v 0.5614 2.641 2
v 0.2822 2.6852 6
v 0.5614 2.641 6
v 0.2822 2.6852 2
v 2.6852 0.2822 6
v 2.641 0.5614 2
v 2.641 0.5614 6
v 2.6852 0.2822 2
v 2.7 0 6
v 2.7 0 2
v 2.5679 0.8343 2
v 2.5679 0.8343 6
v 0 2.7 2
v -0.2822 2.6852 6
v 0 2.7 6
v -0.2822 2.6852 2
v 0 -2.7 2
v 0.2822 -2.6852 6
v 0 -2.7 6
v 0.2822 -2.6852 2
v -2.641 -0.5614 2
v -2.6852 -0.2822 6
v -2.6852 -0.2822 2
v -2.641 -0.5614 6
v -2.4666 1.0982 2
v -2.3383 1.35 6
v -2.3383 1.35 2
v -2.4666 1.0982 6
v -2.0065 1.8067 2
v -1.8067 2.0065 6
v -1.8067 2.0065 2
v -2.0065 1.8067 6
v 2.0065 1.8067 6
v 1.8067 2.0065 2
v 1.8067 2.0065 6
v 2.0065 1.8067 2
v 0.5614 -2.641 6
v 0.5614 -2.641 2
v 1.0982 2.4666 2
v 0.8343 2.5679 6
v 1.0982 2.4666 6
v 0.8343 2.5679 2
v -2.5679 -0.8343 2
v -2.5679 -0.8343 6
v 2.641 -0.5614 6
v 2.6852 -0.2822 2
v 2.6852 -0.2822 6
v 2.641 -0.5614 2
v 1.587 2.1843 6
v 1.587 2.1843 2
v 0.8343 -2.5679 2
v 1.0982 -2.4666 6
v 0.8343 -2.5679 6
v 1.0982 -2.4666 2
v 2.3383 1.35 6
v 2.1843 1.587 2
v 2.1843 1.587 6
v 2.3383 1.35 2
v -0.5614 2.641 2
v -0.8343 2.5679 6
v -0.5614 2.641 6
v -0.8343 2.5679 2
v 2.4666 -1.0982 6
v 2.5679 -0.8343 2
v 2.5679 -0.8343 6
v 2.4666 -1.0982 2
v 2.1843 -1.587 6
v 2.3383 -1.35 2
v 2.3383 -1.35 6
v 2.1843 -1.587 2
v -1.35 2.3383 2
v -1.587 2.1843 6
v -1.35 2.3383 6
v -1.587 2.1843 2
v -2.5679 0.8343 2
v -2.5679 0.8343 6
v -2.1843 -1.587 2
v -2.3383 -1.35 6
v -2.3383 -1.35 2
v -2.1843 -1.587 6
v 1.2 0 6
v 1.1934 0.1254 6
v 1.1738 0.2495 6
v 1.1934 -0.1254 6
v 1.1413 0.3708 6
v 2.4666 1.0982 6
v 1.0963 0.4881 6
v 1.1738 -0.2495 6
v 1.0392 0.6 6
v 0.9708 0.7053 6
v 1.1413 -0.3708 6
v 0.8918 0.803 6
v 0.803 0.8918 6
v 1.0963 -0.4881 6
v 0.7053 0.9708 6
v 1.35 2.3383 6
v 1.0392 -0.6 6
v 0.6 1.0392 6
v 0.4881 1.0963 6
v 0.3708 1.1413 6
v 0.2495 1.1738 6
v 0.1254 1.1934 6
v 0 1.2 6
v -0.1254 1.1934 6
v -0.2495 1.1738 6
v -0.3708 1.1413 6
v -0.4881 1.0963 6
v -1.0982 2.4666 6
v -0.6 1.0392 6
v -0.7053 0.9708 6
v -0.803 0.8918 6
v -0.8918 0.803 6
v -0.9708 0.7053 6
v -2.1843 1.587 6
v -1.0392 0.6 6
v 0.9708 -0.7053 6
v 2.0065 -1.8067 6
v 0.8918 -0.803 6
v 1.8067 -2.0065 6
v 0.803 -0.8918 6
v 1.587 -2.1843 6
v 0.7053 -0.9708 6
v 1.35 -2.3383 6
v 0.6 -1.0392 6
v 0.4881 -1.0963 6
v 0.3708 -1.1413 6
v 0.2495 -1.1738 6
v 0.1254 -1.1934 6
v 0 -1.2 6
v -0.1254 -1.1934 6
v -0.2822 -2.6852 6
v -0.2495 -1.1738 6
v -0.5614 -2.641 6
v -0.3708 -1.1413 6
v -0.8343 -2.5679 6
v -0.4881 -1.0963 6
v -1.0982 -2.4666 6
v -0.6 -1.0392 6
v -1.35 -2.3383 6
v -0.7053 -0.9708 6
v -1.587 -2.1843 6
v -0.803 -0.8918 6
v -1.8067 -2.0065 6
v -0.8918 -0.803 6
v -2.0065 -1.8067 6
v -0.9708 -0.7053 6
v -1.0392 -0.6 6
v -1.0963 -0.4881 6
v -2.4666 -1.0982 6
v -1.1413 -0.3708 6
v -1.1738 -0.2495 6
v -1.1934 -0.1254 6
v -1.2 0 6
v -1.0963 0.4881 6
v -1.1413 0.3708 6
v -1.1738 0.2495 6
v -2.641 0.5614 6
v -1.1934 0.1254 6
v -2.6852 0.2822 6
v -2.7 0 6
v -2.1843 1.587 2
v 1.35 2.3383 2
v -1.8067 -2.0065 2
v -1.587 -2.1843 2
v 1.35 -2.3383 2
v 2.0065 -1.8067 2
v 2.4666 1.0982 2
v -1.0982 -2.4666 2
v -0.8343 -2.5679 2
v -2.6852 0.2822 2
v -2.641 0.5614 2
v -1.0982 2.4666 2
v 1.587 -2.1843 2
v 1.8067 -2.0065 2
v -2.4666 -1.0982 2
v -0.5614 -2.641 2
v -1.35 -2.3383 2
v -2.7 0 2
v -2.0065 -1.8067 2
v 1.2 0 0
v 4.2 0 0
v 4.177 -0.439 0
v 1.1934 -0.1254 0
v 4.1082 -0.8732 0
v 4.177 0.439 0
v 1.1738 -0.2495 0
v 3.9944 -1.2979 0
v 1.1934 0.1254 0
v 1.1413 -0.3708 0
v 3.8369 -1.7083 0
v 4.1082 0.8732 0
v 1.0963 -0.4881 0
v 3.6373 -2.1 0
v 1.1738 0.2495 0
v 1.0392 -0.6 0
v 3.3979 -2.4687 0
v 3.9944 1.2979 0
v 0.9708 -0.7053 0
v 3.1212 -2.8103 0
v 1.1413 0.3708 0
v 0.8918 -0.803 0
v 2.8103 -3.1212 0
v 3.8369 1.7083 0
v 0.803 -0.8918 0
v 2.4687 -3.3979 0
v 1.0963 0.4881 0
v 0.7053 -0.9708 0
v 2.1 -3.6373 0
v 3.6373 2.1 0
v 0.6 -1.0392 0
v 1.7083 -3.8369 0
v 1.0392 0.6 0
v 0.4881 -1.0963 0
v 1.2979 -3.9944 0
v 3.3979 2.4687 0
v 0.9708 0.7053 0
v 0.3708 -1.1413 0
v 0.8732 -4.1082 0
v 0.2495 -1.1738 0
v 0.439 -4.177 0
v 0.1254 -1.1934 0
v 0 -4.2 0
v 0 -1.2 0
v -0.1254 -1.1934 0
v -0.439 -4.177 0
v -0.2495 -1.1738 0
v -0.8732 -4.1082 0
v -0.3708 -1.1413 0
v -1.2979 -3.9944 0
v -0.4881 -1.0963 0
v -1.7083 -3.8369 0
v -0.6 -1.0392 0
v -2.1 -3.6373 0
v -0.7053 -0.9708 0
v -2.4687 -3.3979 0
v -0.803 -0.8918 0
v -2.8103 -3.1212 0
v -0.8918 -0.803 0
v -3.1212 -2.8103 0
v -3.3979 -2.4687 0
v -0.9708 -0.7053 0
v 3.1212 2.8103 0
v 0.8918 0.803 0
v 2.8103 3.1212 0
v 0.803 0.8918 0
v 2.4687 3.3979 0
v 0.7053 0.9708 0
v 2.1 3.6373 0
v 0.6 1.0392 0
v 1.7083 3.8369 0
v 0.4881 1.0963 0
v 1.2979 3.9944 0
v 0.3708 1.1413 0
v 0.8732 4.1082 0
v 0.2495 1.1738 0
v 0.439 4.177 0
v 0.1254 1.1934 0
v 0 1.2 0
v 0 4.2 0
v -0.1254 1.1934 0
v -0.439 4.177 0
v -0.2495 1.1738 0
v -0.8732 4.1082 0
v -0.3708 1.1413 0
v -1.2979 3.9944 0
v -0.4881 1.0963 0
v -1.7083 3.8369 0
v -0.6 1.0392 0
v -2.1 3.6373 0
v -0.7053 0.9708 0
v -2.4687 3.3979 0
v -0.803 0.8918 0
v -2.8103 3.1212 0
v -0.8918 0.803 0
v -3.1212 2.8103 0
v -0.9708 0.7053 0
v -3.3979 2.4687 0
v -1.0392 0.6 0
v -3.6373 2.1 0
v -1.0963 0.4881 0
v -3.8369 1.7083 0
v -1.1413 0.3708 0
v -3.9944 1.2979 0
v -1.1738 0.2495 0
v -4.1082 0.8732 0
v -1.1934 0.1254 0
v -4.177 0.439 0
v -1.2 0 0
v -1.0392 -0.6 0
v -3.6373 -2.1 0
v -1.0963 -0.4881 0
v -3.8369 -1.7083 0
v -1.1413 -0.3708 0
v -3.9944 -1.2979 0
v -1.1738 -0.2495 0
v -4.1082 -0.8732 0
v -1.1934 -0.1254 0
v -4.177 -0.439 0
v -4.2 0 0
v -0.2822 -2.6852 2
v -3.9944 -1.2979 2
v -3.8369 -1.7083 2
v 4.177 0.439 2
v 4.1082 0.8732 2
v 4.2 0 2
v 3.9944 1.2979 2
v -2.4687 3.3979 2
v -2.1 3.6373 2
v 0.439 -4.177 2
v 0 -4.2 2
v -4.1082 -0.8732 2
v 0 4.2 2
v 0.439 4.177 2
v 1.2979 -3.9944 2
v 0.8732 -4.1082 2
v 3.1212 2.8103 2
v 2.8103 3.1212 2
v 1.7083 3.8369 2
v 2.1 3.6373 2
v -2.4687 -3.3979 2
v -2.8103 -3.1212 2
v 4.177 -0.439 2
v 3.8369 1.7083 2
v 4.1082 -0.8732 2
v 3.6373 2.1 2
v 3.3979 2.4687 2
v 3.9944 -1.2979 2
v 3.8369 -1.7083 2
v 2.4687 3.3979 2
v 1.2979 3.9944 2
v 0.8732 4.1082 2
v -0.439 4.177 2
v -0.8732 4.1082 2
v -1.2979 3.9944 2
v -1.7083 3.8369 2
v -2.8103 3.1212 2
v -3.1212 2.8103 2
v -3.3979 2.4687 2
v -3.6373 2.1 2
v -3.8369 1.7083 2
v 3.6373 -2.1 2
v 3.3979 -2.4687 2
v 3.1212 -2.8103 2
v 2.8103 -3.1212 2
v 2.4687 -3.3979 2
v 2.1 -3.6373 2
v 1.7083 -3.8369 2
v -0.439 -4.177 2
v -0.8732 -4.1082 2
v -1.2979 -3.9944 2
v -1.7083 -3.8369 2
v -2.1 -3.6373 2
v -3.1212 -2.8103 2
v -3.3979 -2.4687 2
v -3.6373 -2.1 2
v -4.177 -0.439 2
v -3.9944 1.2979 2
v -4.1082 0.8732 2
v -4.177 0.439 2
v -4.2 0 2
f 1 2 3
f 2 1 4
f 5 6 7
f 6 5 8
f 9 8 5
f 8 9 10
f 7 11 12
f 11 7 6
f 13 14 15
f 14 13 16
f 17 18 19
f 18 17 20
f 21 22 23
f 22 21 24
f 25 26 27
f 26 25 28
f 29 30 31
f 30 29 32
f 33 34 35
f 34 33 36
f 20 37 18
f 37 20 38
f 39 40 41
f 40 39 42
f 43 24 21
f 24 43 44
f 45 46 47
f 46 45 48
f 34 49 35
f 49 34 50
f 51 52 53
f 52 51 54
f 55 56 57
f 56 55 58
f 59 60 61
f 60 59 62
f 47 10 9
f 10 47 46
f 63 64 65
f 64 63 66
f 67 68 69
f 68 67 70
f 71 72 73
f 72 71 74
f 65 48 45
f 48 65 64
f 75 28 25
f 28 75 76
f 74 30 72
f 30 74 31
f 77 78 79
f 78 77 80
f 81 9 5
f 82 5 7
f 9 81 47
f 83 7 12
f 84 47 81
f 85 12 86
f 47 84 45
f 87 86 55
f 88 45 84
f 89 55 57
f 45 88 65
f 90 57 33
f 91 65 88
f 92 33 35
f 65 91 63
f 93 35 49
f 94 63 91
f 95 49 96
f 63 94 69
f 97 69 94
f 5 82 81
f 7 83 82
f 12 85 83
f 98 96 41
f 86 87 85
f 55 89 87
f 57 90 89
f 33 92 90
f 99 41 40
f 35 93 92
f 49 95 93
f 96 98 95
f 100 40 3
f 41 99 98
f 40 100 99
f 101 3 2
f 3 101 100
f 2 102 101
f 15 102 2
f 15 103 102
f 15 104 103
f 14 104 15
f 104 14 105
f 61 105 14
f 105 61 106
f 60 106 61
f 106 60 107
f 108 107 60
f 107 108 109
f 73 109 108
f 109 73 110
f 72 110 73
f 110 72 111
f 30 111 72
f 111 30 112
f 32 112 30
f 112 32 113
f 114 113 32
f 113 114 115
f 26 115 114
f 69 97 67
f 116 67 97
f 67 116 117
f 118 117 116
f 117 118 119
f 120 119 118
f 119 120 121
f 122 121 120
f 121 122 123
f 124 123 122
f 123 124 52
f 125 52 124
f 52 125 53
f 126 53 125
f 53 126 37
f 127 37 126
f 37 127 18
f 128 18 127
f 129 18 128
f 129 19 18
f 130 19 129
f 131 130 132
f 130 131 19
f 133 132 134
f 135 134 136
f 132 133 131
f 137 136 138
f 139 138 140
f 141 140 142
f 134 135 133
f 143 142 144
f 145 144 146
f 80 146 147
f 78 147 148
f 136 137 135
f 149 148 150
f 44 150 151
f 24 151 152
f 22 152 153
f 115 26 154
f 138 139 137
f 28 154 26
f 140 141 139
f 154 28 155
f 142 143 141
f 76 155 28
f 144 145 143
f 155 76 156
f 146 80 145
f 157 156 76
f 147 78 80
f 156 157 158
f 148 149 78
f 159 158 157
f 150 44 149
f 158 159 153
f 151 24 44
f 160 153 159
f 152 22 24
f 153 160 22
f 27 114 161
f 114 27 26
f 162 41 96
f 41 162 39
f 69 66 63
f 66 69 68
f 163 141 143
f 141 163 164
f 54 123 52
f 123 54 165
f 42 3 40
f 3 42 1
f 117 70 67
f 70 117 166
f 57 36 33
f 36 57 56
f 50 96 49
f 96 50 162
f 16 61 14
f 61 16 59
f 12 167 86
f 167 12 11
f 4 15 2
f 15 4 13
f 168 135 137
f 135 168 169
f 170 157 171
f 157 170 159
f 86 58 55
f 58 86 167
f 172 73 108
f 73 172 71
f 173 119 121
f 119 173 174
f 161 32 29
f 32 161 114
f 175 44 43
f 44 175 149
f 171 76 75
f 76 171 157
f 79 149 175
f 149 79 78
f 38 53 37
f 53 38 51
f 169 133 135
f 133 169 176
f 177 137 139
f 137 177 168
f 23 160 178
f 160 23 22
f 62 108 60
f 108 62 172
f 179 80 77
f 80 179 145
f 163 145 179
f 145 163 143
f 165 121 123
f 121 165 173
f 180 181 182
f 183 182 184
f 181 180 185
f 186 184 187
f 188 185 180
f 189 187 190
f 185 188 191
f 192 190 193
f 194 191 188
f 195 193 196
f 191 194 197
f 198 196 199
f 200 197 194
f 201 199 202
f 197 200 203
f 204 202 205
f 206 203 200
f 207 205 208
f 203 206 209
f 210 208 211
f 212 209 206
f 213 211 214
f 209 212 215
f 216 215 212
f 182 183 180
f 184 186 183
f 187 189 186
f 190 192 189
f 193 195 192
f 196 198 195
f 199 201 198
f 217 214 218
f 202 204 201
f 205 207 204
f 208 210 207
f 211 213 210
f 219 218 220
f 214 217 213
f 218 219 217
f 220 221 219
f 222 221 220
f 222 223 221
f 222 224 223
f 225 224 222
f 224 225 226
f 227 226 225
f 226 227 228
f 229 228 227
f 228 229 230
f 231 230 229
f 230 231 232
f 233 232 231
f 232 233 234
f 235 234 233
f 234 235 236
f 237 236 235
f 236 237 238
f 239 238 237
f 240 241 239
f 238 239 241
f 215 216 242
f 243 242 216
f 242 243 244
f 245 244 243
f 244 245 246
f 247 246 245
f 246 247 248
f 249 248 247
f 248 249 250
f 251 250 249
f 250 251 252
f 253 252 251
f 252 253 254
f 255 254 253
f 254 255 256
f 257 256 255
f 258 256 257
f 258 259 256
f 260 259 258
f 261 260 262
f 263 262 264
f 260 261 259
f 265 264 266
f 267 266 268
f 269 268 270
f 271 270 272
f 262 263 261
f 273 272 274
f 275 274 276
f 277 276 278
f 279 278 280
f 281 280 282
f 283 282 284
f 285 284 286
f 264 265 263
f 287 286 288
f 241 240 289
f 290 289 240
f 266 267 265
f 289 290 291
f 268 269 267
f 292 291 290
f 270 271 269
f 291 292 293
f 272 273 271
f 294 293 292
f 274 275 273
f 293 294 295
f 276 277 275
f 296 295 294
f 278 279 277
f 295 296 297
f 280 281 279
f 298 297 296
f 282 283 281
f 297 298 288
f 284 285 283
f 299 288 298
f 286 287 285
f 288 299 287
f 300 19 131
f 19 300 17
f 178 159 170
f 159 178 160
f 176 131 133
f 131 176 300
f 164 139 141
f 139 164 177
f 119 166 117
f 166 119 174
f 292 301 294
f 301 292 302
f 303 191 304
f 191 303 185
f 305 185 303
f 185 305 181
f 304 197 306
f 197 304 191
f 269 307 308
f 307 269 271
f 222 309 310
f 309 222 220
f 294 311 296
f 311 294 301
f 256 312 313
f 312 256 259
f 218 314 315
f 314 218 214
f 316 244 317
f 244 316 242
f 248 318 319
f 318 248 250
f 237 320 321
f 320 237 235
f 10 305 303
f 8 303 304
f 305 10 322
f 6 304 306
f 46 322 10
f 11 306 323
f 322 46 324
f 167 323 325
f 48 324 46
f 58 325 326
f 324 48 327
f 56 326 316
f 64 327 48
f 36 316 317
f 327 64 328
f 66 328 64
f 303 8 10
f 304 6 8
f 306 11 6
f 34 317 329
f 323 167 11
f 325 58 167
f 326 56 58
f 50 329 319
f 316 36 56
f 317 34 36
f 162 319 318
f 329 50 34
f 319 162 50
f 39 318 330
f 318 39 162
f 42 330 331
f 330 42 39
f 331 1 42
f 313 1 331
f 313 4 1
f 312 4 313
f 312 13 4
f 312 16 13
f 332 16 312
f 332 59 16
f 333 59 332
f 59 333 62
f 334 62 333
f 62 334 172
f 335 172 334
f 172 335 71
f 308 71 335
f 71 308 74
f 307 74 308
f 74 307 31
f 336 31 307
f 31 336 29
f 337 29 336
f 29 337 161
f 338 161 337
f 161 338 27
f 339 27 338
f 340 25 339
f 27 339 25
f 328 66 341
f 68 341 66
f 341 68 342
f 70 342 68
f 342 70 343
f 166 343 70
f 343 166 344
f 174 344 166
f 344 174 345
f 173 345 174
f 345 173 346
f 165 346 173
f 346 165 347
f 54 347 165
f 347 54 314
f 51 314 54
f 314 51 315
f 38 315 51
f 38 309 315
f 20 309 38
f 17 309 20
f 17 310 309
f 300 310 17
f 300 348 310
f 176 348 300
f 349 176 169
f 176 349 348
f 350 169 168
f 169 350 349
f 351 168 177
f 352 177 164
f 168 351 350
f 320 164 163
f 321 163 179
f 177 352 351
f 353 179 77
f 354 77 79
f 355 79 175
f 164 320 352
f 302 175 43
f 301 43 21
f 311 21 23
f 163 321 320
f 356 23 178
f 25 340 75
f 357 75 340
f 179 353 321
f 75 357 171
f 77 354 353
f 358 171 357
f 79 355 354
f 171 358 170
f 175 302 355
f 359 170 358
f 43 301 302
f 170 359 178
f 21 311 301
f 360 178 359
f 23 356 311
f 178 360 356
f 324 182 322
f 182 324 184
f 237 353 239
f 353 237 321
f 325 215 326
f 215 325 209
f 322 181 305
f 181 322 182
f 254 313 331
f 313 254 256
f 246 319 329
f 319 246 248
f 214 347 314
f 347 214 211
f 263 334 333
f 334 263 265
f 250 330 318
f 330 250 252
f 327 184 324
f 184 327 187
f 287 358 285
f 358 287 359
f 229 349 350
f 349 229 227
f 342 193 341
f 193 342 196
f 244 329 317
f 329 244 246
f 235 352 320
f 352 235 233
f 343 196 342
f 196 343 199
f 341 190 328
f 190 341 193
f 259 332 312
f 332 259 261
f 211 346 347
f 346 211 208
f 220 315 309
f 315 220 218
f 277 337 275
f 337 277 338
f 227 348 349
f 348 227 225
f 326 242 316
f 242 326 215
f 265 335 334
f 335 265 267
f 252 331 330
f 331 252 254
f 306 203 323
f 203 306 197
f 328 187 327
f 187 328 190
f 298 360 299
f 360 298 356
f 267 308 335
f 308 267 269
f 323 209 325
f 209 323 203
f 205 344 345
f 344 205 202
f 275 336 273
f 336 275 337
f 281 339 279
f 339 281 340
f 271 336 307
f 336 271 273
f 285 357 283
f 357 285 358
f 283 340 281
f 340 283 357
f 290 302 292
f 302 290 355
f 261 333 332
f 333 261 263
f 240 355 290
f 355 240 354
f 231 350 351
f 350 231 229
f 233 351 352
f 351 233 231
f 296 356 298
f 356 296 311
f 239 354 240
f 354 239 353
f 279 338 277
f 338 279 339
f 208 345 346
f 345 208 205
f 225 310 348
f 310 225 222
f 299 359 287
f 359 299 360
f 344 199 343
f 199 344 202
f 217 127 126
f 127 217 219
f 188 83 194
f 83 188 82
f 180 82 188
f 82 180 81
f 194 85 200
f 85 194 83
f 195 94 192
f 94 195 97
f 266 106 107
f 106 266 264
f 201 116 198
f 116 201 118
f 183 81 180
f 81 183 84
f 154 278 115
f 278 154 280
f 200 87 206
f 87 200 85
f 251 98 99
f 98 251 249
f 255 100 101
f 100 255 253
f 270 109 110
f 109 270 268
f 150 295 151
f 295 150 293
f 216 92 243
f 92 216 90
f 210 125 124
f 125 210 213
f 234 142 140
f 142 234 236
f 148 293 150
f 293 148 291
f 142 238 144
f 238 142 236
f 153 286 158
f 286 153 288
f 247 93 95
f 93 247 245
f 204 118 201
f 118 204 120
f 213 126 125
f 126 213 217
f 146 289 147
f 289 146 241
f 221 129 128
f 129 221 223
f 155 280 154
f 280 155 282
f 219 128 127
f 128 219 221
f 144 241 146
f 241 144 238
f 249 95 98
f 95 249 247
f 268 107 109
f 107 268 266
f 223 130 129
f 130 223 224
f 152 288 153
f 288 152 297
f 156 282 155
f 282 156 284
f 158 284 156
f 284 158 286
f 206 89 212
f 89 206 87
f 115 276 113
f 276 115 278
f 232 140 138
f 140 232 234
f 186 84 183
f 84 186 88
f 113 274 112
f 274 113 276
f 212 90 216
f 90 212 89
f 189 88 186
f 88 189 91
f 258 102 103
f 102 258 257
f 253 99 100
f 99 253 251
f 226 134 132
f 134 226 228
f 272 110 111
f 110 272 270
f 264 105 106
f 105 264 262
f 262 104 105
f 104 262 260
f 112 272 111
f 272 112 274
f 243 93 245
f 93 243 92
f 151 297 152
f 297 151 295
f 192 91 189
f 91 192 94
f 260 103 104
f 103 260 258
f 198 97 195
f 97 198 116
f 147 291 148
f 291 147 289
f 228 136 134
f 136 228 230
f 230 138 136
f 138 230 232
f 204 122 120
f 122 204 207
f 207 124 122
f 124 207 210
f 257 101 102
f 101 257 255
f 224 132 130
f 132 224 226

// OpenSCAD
// Rivet nut / nutsert.
$fn = 60;
eps = 0.02;
thread_d = 2.4;
outer_d = 5;
length = 6;
flange_d = 8;
difference() { union() { cylinder(d=max(outer_d, thread_d+3),h=length); cylinder(d=max(flange_d, thread_d+6),h=2); } translate([0,0,-eps]) cylinder(d=thread_d,h=length+2*eps); }
